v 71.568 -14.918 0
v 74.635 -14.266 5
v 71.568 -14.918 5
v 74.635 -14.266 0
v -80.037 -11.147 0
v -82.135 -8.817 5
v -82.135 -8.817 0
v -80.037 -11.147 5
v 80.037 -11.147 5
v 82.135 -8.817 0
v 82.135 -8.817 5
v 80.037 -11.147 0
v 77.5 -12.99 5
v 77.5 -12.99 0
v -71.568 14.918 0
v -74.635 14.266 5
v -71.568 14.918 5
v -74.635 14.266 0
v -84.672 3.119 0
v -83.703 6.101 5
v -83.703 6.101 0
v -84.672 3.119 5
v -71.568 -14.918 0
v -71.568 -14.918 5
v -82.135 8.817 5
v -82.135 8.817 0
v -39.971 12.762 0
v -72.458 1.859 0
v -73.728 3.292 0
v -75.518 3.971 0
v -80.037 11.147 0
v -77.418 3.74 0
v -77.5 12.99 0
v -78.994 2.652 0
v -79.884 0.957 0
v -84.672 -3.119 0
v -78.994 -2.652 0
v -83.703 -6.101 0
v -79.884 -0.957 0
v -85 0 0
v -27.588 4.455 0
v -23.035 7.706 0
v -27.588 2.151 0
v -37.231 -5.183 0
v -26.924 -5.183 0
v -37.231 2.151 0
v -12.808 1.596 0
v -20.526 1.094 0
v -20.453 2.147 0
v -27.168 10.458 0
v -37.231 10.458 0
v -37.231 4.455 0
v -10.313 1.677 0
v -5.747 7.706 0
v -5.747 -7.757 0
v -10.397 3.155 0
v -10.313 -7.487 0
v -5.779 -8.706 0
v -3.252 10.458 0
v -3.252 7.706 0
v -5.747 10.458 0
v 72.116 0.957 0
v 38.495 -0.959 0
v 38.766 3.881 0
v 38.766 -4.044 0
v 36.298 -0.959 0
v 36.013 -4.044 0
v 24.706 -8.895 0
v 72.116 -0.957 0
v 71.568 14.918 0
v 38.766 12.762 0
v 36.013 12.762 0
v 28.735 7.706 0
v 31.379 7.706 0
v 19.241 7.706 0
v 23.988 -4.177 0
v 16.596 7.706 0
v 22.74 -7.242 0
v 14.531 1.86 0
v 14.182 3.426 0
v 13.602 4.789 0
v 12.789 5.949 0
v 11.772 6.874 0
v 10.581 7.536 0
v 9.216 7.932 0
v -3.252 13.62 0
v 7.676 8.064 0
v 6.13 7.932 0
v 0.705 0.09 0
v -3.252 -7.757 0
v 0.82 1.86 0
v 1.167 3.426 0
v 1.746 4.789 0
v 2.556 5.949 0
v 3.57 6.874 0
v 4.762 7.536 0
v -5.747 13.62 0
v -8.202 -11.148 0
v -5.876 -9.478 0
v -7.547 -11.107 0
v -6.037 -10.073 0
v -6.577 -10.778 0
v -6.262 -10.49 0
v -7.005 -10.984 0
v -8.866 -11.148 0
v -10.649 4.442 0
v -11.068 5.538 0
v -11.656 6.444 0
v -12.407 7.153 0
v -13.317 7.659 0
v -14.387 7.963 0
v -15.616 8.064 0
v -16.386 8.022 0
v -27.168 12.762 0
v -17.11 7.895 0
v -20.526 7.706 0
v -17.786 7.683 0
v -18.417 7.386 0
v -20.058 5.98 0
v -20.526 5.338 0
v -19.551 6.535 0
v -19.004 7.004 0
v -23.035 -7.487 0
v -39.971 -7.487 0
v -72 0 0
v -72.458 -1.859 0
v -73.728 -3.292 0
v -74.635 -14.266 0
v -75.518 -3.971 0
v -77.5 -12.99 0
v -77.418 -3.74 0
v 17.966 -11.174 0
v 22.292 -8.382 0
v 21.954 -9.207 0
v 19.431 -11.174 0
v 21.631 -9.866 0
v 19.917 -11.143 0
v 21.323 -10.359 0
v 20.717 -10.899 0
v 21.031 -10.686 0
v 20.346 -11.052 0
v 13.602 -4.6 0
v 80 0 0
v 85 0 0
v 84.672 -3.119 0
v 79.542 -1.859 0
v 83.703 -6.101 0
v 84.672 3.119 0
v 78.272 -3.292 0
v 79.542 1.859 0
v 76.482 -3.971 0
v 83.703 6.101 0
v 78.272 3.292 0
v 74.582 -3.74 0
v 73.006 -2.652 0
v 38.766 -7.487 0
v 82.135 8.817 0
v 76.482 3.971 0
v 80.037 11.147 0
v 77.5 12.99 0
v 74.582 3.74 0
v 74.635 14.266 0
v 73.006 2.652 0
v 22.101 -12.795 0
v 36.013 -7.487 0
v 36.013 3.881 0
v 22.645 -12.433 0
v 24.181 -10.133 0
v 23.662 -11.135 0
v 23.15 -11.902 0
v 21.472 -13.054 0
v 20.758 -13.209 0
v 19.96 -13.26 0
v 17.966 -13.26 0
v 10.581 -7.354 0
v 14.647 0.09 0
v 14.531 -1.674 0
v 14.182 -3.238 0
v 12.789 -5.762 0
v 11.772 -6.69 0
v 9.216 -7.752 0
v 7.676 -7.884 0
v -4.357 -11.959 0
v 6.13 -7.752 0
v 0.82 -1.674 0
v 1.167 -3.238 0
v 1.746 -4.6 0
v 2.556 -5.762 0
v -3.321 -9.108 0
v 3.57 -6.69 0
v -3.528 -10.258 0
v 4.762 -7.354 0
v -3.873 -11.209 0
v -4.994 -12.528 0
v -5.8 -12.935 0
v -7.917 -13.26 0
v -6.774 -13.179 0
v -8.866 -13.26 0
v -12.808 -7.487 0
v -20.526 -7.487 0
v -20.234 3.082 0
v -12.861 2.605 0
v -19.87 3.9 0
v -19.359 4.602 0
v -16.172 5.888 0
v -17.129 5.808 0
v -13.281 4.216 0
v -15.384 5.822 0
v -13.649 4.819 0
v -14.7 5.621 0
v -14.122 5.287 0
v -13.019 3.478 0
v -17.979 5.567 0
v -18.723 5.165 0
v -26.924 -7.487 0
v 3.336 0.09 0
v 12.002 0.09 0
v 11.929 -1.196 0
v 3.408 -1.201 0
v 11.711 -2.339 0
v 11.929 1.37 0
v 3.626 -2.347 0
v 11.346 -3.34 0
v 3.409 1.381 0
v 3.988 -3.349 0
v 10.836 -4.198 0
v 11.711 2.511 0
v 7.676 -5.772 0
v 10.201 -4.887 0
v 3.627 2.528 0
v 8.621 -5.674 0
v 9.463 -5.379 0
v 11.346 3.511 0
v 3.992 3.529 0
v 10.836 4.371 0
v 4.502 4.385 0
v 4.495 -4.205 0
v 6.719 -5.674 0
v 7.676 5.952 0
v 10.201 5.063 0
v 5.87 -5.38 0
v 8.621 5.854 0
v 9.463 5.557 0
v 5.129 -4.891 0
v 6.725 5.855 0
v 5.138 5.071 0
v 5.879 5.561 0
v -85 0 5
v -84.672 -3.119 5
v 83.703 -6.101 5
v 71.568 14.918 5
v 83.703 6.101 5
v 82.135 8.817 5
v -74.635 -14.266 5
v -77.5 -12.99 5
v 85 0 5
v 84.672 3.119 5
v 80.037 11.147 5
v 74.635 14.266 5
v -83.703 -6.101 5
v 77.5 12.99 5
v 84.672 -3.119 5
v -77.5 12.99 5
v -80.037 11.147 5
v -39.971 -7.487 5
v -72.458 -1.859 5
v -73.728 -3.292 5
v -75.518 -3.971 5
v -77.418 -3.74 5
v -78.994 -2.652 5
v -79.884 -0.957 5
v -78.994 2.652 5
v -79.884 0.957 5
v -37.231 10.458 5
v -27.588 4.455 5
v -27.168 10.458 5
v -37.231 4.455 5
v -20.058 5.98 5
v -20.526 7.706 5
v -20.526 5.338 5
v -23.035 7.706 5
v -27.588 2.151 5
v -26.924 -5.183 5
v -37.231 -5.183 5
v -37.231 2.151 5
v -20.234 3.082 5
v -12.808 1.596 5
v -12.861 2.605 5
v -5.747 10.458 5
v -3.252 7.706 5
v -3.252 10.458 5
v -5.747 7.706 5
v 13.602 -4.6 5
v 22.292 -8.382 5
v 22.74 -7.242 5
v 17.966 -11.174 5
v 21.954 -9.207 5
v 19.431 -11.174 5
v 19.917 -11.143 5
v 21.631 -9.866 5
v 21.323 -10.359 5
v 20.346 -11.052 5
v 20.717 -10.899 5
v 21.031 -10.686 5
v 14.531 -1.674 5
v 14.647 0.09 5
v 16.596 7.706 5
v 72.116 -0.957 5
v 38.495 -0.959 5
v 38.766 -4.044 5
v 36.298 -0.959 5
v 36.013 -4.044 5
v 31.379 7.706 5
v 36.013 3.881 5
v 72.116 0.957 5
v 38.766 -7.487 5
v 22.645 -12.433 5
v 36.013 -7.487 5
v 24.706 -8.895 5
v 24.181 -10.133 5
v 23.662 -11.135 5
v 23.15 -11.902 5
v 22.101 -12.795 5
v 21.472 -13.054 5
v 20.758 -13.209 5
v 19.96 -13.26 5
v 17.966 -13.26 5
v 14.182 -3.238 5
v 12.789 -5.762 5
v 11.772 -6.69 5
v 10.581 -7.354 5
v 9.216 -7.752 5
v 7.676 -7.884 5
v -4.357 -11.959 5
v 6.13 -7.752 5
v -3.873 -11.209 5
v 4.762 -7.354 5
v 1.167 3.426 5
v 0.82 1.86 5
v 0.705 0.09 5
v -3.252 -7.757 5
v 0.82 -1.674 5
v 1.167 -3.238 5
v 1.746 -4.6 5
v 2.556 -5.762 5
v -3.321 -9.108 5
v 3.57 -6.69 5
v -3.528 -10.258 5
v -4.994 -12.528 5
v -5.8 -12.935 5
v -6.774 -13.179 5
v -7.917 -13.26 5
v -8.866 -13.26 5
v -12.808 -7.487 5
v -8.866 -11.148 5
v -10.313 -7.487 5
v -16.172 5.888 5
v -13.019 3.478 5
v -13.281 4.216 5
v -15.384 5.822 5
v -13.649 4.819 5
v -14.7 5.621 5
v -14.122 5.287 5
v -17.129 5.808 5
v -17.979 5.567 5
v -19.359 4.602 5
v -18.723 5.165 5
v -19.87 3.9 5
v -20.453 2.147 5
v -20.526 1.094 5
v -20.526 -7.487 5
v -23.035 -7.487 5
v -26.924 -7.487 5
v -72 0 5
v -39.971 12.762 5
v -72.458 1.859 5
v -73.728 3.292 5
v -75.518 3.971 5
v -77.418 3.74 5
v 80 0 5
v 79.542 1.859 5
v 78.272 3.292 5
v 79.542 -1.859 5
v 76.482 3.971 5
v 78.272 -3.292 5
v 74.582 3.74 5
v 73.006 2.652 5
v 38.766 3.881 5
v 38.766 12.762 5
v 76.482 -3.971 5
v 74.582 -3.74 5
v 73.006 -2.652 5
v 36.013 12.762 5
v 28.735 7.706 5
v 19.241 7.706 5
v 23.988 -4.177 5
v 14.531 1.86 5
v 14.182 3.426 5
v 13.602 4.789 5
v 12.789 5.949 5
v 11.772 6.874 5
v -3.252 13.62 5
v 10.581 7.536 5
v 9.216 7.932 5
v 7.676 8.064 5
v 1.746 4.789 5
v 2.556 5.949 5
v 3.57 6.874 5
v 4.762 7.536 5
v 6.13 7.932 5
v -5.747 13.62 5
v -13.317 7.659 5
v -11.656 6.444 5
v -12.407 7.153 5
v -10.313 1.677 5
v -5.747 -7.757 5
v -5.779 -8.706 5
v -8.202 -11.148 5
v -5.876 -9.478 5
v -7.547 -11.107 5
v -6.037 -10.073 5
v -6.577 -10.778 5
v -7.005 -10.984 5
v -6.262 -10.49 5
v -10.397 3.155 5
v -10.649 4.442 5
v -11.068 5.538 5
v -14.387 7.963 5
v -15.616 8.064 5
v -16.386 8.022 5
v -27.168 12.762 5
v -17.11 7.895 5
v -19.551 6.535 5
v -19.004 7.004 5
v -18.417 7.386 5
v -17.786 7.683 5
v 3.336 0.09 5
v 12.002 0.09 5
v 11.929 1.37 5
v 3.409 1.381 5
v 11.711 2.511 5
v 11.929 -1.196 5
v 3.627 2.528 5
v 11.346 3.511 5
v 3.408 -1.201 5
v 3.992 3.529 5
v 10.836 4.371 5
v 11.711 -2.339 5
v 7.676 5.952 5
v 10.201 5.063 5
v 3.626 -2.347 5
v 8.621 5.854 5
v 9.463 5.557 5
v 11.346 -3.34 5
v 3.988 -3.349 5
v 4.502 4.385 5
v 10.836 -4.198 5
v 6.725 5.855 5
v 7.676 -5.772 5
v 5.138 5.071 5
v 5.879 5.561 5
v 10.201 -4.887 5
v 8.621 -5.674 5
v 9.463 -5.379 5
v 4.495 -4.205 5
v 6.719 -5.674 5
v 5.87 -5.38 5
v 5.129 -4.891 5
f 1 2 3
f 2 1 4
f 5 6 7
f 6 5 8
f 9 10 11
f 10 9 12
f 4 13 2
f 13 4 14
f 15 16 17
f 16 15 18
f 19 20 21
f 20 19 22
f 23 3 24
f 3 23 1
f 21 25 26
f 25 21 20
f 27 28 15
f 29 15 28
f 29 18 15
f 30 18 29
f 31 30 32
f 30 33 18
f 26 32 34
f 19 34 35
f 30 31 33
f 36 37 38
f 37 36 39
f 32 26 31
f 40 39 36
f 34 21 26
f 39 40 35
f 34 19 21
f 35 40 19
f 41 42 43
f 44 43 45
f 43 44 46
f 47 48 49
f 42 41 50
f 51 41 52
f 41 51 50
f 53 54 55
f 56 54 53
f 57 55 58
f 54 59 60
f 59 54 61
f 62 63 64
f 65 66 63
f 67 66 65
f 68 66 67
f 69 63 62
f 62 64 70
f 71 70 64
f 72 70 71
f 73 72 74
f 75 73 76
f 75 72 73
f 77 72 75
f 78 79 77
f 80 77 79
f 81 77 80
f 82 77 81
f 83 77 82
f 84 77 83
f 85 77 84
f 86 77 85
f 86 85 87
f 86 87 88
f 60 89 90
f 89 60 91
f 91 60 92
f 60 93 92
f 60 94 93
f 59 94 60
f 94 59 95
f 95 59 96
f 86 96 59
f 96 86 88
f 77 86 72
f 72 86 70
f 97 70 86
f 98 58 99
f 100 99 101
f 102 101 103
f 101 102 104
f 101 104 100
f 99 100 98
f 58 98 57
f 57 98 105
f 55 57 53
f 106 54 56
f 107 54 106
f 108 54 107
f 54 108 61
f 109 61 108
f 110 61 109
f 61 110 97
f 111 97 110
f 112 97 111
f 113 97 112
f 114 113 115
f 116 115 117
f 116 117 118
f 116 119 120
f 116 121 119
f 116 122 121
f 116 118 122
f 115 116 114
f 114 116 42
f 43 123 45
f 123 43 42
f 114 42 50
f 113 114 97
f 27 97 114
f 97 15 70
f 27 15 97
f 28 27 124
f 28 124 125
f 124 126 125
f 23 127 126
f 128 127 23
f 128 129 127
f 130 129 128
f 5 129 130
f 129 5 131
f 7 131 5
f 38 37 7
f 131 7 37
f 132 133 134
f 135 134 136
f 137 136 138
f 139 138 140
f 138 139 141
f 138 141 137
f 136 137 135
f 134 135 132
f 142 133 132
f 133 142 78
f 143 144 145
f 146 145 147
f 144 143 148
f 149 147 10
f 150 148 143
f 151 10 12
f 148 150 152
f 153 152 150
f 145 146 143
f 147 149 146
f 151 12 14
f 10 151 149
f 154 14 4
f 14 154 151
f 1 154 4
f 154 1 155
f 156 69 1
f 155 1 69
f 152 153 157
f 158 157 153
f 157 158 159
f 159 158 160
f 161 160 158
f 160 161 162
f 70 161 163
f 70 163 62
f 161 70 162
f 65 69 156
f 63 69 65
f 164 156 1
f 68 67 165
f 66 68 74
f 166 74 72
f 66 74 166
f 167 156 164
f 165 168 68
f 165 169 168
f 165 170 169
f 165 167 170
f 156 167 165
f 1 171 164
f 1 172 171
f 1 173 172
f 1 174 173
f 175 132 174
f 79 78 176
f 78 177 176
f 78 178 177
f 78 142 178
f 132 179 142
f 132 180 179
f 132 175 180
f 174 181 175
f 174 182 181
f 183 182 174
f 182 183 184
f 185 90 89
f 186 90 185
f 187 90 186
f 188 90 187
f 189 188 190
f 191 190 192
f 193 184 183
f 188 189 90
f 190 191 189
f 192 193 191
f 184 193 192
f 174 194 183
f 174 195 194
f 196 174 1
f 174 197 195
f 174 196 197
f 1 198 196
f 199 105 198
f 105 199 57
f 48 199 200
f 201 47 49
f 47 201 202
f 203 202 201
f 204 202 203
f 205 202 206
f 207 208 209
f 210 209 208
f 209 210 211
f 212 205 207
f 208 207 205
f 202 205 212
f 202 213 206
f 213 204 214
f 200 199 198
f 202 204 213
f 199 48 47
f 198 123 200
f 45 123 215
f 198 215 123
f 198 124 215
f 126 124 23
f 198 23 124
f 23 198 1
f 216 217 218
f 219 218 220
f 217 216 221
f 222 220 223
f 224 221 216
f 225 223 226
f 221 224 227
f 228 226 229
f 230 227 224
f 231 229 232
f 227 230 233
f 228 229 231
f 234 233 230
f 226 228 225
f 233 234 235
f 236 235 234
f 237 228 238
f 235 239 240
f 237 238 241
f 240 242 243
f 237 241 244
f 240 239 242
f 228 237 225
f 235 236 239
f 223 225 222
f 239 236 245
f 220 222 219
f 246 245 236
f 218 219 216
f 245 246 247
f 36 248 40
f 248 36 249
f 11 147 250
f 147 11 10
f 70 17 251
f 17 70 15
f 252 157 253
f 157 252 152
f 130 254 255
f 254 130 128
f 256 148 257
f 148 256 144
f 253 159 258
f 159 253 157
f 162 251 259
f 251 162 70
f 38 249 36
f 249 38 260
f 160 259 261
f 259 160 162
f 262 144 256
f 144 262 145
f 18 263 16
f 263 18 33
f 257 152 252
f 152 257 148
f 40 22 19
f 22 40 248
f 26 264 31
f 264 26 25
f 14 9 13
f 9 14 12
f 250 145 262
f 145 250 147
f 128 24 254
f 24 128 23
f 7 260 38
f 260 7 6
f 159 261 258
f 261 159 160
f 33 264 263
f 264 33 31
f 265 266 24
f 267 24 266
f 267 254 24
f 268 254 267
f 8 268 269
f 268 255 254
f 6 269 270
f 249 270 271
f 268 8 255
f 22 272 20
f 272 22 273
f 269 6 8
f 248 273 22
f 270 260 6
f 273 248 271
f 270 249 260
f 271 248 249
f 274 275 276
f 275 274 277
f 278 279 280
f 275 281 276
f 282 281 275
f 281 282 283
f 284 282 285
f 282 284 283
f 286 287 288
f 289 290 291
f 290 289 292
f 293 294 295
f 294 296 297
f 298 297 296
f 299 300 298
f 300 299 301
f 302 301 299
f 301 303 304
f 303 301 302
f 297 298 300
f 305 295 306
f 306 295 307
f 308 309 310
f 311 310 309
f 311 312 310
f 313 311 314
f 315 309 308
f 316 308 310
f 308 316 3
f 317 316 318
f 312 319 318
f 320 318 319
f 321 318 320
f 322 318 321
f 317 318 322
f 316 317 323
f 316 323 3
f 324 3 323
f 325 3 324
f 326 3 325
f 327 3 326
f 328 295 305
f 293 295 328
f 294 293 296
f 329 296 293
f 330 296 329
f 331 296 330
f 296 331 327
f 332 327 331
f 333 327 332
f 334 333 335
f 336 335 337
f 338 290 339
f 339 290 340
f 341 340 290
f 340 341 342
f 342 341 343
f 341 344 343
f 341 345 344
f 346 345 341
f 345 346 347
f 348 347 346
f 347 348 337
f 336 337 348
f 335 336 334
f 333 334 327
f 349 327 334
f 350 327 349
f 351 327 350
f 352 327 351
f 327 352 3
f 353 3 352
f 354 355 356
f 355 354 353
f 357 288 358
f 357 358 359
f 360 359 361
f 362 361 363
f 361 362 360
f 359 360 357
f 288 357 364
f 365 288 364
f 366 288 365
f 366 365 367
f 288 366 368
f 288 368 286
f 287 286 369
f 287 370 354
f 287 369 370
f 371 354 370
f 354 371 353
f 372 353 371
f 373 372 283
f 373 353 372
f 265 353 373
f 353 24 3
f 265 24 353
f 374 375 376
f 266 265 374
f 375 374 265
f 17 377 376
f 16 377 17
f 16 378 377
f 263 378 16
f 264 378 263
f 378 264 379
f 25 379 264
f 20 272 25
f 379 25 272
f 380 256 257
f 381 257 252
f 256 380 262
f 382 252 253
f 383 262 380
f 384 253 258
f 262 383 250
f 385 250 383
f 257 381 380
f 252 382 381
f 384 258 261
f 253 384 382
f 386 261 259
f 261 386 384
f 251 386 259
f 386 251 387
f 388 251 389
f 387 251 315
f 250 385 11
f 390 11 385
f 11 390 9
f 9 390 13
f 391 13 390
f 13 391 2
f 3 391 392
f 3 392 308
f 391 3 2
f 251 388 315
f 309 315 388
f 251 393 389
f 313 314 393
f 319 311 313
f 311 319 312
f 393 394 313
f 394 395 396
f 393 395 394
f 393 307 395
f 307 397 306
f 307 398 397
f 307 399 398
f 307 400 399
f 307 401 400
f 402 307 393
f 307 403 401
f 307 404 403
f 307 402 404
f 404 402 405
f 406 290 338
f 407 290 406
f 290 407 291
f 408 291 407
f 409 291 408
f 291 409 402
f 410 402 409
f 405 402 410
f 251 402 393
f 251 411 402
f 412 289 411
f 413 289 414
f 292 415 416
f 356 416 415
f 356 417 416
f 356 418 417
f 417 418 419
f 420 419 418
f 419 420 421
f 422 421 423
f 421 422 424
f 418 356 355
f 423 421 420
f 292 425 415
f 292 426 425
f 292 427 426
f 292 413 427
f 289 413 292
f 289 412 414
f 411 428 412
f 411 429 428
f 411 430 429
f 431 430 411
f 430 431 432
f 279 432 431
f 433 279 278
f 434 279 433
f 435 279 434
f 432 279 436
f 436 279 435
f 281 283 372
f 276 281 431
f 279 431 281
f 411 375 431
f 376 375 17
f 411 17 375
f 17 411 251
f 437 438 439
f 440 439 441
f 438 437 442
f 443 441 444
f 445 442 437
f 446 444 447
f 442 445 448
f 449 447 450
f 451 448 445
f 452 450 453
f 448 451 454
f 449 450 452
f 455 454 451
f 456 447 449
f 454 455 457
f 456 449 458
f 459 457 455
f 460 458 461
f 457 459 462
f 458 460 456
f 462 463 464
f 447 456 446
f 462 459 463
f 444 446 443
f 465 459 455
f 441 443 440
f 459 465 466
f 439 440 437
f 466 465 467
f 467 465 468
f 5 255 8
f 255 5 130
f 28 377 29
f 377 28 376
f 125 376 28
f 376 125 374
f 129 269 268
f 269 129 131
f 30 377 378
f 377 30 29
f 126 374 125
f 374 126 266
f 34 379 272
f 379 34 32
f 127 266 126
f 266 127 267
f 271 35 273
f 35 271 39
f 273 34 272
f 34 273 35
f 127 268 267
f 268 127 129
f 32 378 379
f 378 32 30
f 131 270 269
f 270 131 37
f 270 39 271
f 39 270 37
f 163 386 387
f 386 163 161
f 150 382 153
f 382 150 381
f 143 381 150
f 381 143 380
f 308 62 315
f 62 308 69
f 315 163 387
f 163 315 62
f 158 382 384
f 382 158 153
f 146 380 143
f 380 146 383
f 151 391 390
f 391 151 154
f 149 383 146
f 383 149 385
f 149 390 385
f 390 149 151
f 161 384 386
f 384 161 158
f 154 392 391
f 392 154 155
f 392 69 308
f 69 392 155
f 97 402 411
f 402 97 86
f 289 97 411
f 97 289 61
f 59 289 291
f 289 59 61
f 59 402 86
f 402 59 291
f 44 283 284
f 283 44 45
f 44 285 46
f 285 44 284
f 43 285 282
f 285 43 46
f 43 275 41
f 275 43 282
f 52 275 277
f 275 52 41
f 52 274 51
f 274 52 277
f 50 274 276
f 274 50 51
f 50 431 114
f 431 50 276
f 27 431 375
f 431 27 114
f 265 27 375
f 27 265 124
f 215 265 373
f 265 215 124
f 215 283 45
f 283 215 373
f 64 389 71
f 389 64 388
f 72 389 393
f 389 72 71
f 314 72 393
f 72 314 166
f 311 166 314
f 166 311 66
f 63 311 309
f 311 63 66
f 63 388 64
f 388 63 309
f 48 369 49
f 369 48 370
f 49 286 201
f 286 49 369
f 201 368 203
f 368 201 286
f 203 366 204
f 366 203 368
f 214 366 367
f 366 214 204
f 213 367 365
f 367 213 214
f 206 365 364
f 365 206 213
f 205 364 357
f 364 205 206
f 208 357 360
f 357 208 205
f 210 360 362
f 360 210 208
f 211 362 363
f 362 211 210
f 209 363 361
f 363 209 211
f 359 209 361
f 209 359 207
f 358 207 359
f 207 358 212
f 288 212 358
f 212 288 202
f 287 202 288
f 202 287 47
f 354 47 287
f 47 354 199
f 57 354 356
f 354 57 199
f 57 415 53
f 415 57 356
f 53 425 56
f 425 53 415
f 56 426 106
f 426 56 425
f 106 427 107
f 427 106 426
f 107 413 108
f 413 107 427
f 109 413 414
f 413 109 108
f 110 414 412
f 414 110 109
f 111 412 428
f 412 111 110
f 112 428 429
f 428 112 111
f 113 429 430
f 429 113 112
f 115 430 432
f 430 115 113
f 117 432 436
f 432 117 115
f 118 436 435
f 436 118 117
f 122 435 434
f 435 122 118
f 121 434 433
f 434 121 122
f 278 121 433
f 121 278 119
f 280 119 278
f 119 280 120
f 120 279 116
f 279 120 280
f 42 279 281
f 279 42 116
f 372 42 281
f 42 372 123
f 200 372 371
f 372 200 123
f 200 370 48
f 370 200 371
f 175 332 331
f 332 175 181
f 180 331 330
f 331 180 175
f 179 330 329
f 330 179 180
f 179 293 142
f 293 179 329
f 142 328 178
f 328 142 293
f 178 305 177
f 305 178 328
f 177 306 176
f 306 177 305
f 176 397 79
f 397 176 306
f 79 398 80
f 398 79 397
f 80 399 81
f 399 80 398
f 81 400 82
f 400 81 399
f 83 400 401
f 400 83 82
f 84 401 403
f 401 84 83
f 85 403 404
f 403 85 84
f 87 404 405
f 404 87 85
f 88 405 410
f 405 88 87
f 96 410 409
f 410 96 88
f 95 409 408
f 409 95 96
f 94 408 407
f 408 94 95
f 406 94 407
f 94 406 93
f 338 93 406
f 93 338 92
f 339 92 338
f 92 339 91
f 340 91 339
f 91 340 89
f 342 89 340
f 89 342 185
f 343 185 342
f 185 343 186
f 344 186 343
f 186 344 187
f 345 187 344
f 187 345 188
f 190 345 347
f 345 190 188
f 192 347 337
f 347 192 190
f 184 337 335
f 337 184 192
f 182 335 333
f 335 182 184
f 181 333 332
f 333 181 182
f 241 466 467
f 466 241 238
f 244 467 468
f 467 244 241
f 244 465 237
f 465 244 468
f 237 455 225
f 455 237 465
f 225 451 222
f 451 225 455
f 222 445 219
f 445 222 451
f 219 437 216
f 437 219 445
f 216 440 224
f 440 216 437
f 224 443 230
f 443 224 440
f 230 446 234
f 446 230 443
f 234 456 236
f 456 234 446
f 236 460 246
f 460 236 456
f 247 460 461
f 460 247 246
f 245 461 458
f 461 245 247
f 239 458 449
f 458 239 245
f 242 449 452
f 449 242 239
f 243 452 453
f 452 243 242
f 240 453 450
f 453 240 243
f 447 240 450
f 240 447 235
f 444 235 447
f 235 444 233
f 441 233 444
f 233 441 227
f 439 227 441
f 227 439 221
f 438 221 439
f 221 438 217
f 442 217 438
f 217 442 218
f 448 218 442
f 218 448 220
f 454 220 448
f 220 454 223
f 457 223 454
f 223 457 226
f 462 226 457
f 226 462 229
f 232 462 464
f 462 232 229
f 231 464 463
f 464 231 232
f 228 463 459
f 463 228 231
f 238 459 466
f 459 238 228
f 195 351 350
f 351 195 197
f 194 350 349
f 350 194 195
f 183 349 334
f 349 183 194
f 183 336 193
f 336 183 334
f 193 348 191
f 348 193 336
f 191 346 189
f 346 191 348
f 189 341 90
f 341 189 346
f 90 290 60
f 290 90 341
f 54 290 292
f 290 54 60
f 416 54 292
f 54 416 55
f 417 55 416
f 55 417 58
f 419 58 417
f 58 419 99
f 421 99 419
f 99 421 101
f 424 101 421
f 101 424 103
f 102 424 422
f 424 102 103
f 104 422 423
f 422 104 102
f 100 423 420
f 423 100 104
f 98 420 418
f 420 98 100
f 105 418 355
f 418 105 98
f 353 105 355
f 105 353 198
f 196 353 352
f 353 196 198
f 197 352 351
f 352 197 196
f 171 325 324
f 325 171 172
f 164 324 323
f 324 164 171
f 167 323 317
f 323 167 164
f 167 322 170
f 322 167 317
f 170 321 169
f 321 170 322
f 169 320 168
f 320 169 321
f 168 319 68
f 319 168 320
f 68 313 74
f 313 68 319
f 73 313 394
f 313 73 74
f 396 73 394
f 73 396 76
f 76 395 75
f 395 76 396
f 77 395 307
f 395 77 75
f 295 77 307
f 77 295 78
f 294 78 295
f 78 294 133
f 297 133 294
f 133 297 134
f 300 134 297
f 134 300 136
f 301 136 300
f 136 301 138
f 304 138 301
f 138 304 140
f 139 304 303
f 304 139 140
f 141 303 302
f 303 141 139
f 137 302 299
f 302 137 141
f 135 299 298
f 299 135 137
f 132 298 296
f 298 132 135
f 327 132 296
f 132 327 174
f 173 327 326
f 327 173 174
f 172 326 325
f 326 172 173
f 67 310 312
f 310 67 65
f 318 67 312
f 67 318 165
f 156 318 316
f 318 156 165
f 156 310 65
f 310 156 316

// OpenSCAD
//Customizable text
Text = "Enjoy!";
//Text size
Text_size = 20;
//Choose font
fontname="Pacifico"; //[Pacifico,ABeeZee,Abel,Abril Fatface,Aclonica,Acme,Aldrich,Alef,Alegreya,Alegreya Sans,Alegreya Sans SC,Alegreya SC,Alex Brush,Alfa Slab One,Alice,Alike,Alike Angular,Allan,Allerta,Allerta Stencil,Allura,Almendra,Almendra Display,Almendra SC,Amarante,Amaranth,Amatic SC,Amethysta,Amiri,Anaheim,Andada,Andika,Angkor,Annie Use Your Telescope,Anonymous Pro,Antic,Antic Didone,Antic Slab,Anton,Arapey,Arbutus,Arbutus Slab,Architects Daughter,Archivo Black,Archivo Narrow,Arimo,Arizonia,Armata,Artifika,Arvo,Asap,Asset,Astloch,Asul,Atomic Age,Aubrey,Audiowide,Autour One,Average,Average Sans,Averia Gruesa Libre,Averia Libre,Averia Sans Libre,Averia Serif Libre,Bad Script,Balthazar,Bangers,Basic,Battambang,Baumans,Bayon,Belgrano,Belleza,BenchNine,Bentham,Berkshire Swash,Bevan,Bigelow Rules,Bigshot One,Bilbo,Bilbo Swash Caps,Bitter,Black Ops One,Bokor,Bonbon,Boogaloo,Bowlby One,Bowlby One SC,Brawler,Bree Serif,Bubblegum Sans,Bubbler One,Buda,Buenard,Butcherman,Butterfly Kids,Cabin,Cabin Condensed,Cabin Sketch,Caesar Dressing,Cagliostro,Calligraffitti,Cambay,Cambo,Candal,Cantarell,Cantata One,Cantora One,Capriola,Cardo,Carme,Carrois Gothic,Carrois Gothic SC]

//sottrazione per fori
difference(){
    //Intero lunghezza piattina
    T = 140;
    //Piattina
    translate([-T/2,0,0])
    hull(){
        cylinder(h=5, d=30);
        translate([T,0,0])
        cylinder(h=5, d=30);
}
    //fori cilindrici
    translate([-76,0,0])
    cylinder(h=5, d=8);
    translate([76,0,0])
    cylinder(h=5, d=8);

    //scritta
    linear_extrude(height=5)
    text (Text, Text_size, halign="center", valign="center", font=fontname);
}
